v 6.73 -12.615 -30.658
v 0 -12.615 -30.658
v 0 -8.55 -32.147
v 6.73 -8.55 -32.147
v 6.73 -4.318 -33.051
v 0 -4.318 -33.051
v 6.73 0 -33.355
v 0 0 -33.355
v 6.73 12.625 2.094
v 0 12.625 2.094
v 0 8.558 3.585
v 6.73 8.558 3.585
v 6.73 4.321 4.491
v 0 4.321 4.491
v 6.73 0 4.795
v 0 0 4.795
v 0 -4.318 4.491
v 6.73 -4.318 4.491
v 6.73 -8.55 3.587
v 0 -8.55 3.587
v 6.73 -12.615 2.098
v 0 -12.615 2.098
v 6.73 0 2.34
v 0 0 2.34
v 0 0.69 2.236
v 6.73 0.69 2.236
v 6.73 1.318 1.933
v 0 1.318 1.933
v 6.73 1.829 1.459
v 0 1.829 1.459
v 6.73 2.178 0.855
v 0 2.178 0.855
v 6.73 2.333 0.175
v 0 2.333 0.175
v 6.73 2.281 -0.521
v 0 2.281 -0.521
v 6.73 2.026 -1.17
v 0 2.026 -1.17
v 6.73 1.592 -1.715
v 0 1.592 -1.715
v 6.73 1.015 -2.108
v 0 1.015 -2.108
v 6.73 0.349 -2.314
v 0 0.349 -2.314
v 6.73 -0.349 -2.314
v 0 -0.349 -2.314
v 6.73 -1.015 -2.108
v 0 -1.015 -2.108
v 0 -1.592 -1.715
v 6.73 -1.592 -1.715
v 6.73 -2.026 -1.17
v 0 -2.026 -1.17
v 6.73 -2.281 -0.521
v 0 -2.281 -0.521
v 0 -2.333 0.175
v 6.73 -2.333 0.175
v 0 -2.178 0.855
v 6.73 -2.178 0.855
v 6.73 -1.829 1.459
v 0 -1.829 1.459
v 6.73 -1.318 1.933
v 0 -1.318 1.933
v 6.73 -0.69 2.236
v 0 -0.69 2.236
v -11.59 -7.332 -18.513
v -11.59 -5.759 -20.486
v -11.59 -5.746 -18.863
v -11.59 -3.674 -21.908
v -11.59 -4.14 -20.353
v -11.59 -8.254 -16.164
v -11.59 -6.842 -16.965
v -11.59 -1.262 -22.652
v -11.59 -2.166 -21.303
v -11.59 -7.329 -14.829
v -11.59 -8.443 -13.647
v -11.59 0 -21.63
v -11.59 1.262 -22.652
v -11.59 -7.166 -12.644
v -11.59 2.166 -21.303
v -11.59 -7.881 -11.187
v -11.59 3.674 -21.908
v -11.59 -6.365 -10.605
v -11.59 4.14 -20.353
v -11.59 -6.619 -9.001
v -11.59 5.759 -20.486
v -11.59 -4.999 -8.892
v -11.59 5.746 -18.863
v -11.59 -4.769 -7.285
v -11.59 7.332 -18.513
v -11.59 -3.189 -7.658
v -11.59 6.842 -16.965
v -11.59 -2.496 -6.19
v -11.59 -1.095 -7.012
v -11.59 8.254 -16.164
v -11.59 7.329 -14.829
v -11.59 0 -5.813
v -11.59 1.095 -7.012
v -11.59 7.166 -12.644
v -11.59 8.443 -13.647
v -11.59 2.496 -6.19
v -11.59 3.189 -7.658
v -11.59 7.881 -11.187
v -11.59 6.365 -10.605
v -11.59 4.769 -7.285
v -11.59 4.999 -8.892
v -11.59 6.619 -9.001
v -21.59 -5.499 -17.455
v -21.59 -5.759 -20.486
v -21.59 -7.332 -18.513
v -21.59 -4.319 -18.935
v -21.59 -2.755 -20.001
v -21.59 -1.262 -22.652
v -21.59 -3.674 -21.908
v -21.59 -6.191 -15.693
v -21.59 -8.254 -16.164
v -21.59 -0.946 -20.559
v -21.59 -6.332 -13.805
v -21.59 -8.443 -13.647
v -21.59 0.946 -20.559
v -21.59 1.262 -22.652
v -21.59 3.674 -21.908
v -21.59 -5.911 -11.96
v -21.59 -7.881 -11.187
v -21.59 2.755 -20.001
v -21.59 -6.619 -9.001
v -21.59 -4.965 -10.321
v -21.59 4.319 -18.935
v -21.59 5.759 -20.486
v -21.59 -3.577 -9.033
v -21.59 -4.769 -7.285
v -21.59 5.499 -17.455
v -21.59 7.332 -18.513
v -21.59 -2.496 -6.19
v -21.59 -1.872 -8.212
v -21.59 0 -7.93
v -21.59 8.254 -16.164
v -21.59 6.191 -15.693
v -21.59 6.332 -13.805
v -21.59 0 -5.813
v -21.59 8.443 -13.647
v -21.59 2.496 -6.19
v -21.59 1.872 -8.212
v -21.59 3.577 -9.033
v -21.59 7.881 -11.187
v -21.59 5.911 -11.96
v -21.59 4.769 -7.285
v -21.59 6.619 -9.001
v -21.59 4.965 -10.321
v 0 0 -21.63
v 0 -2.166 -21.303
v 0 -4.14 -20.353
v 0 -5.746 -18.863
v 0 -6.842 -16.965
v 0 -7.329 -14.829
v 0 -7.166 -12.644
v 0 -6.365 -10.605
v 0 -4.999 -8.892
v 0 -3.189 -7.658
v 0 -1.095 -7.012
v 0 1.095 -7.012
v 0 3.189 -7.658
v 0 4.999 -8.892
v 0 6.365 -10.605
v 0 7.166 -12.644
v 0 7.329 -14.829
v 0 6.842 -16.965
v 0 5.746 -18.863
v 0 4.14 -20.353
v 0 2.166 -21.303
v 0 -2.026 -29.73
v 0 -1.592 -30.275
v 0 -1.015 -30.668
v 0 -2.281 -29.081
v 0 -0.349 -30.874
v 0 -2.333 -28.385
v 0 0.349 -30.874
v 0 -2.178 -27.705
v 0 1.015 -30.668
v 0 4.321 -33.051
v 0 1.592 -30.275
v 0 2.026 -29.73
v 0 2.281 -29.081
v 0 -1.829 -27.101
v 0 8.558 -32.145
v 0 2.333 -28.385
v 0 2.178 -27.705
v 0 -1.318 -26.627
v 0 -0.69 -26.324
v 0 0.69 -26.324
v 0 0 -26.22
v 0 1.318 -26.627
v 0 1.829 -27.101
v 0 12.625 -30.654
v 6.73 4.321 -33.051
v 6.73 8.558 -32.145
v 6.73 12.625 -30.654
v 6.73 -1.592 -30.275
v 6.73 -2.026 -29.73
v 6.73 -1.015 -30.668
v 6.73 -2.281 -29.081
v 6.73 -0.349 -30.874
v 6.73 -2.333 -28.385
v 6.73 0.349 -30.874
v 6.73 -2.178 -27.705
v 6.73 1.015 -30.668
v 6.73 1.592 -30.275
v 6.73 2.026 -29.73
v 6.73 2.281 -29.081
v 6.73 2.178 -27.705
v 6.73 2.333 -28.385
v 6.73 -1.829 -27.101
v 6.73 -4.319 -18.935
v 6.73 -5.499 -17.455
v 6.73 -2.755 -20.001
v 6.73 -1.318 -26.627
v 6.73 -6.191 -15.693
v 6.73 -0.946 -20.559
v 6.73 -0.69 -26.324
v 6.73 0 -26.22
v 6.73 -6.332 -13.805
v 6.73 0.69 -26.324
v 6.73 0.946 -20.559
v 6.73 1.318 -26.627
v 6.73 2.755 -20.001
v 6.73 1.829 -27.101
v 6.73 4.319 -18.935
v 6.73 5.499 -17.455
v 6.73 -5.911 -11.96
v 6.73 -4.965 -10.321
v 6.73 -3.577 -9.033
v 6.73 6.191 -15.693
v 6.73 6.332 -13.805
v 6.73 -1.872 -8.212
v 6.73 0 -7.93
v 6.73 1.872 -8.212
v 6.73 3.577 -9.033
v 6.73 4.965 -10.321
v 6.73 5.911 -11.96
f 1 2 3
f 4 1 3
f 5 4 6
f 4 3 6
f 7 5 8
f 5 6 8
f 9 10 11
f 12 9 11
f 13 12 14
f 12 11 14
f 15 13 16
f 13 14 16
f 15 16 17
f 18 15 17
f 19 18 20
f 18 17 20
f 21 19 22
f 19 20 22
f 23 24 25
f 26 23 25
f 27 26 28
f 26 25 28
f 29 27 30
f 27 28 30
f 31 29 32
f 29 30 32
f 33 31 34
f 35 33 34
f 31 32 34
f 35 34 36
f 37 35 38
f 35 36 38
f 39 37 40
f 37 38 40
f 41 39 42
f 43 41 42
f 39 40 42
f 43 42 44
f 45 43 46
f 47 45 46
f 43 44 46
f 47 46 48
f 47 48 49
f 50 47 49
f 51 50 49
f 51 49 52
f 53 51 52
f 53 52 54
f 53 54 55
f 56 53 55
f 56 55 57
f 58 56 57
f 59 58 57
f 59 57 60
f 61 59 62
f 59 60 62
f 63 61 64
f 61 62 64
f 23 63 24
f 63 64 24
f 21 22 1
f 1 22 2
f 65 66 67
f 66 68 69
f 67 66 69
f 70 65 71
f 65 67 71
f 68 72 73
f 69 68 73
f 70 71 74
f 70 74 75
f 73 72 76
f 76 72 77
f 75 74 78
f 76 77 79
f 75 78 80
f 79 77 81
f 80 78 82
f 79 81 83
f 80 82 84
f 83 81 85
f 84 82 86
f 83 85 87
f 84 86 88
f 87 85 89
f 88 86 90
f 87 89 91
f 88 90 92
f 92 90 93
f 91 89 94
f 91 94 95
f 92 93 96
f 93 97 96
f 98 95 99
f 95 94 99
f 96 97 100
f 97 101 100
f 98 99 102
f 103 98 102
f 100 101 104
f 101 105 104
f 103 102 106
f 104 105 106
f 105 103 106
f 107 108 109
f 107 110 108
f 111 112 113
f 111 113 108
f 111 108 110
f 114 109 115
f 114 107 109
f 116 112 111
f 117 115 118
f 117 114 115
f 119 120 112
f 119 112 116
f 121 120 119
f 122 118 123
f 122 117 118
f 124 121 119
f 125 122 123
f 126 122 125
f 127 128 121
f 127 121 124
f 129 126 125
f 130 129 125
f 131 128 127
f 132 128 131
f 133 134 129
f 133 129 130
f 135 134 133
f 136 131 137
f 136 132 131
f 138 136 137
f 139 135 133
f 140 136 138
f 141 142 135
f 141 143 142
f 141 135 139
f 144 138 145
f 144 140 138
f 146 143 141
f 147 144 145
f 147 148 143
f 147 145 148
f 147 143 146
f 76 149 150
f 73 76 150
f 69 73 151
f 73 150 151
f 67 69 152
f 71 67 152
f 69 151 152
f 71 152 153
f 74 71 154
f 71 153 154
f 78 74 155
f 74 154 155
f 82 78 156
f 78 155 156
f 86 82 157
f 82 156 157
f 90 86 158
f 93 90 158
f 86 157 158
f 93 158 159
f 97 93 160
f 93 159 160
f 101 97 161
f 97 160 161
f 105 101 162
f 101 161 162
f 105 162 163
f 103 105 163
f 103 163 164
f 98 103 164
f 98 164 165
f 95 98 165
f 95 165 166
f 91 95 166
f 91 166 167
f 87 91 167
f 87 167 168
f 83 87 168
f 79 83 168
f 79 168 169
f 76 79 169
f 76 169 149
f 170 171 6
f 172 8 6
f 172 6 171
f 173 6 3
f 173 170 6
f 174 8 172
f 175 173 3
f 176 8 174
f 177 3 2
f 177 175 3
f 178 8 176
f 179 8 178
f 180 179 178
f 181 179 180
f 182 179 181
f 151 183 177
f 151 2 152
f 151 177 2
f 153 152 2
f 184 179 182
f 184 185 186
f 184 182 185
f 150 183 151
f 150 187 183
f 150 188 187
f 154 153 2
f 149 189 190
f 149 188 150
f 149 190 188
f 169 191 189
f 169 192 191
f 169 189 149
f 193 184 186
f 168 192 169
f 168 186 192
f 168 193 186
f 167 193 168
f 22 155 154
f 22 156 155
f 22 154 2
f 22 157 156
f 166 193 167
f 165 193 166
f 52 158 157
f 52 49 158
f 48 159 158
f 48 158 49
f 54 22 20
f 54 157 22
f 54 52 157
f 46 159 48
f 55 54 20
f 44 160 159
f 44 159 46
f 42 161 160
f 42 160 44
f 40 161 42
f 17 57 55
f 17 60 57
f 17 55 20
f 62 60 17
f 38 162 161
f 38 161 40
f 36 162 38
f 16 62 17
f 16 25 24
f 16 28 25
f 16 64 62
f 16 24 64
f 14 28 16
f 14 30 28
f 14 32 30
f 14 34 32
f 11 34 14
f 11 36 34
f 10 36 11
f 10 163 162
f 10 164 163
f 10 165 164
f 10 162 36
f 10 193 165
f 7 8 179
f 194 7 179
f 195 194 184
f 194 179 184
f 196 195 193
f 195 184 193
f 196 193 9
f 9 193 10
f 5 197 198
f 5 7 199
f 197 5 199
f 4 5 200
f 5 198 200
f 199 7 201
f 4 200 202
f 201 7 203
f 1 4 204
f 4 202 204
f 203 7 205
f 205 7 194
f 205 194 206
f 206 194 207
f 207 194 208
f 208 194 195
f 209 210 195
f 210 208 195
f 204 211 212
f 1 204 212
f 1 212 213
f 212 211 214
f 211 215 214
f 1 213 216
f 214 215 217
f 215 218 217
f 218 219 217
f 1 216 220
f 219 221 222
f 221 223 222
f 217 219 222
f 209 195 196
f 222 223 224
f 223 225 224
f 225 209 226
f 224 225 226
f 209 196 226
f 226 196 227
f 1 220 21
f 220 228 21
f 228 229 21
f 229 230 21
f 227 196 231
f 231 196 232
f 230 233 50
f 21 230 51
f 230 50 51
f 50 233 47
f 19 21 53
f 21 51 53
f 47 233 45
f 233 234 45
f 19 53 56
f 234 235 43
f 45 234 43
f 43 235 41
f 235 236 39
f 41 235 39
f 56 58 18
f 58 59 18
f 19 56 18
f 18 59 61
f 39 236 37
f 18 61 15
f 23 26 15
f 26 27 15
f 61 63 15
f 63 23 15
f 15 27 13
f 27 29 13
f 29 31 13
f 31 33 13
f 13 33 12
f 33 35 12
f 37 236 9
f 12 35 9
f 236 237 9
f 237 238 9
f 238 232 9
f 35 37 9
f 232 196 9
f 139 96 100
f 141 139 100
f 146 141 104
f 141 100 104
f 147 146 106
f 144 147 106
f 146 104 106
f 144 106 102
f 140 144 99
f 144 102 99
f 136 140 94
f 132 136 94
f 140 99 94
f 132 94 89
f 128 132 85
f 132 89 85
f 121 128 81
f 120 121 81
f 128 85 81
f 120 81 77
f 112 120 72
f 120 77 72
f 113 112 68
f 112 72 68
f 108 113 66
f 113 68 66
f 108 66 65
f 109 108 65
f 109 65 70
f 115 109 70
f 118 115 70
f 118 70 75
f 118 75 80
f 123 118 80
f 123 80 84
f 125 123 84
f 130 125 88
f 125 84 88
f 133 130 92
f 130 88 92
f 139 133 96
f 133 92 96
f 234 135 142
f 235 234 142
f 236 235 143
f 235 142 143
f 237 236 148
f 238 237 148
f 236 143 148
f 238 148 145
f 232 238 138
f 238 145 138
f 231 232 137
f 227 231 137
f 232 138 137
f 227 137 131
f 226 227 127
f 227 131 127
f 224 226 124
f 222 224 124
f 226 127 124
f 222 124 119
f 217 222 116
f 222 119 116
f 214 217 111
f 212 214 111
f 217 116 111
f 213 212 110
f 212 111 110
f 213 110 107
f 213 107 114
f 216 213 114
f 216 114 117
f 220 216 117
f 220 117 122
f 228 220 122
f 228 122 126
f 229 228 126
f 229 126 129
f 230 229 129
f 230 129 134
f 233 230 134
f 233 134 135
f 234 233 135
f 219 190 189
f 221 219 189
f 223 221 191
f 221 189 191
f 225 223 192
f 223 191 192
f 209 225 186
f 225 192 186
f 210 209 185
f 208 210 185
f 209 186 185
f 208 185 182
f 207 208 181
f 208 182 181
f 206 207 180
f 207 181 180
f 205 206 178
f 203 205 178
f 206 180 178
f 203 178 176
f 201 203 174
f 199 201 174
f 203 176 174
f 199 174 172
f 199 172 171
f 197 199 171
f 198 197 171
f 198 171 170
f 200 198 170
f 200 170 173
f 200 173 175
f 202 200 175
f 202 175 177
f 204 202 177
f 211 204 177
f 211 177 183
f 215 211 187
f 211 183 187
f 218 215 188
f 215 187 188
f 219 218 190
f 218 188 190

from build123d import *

# Parameters (mm, degrees)
BOSS_EXTRUDE1_DEPTH = 6.73
CUT_EXTRUDE5_DEPTH  = 6.73
SKETCH4_R           = 7.35
BOSS_EXTRUDE2_DEPTH = 21.59
SKETCH5_R           = 6.35
CUT_EXTRUDE6_DEPTH  = 46.540850343
BOSS_EXTRUDE3_START = -10
SKETCH6_R           = 8.466621056
SKETCH6_R_2         = 7.35
BOSS_EXTRUDE3_DEPTH = 10
SKETCH7_R           = 2.5
SKETCH7_R_2         = 2.34
BOSS_EXTRUDE4_DEPTH = 6.73


with BuildPart() as part:
    # Sketch1 → Boss-Extrude1 (new body)
    with BuildSketch(Plane(origin=(0, 0, 0), x_dir=(0, 0, -1), z_dir=(1, 0, 0))):
        with BuildLine():
            Line((14.28, 0), (2.5, 0))
            ThreePointArc((2.5, 0), (0, -2.5), (-2.5, 0))
            Line((-2.5, 0), (-4.795, 0))
            Line((-4.795, 0), (-4.795, -12.615))
            Line((-4.795, -12.615), (14.28, -12.615))
            Line((14.28, -12.615), (14.28, 0))
        make_face()
        with BuildLine():
            ThreePointArc((-2.5, 0), (0, 2.5), (2.5, 0))
            Line((2.5, 0), (14.28, 0))
            Line((14.28, 0), (14.28, 12.625))
            Line((14.28, 12.625), (-4.795, 12.625))
            Line((-4.795, 12.625), (-4.795, 0))
            Line((-4.795, 0), (-2.5, 0))
        make_face()
        with BuildLine():
            Line((14.28, 12.625), (14.28, 0))
            Line((14.28, 0), (26.06, 0))
            ThreePointArc((26.06, 0), (28.56, 2.5), (31.06, 0))
            Line((31.06, 0), (33.355, 0))
            Line((33.355, 0), (33.355, 12.625))
            Line((33.355, 12.625), (14.28, 12.625))
        make_face()
        with BuildLine():
            Line((26.06, 0), (14.28, 0))
            Line((14.28, 0), (14.28, -12.615))
            Line((14.28, -12.615), (33.355, -12.615))
            Line((33.355, -12.615), (33.355, 0))
            Line((33.355, 0), (31.06, 0))
            ThreePointArc((31.06, 0), (28.56, -2.5), (26.06, 0))
        make_face()
    extrude(amount=BOSS_EXTRUDE1_DEPTH)

    # Sketch3 → Cut-Extrude5 (cut)
    with BuildSketch(Plane.ZY):
        with BuildLine():
            Line((4.795, -12.615), (4.795, 0))
            ThreePointArc((4.795, 0), (4.113307599, -6.450002601), (2.098352225, -12.615))
            Line((2.098352225, -12.615), (4.795, -12.615))
        make_face()
        with BuildLine():
            Line((4.795, 12.625), (2.093870071, 12.625))
            ThreePointArc((2.093870071, 12.625), (4.112161723, 6.455360716), (4.795, 0))
            Line((4.795, 0), (4.795, 12.625))
        make_face()
        with BuildLine():
            ThreePointArc((-33.355, 1.23e-07), (-32.67216171, 6.455360776), (-30.653870071, 12.625))
            Line((-30.653870071, 12.625), (-33.355, 12.625))
            Line((-33.355, 12.625), (-33.355, 1.23e-07))
        make_face()
        with BuildLine():
            ThreePointArc((-30.658352225, -12.615), (-32.673307611, -6.450002541), (-33.355, 1.23e-07))
            Line((-33.355, 1.23e-07), (-33.355, -12.615))
            Line((-33.355, -12.615), (-30.658352225, -12.615))
        make_face()
    extrude(amount=-CUT_EXTRUDE5_DEPTH, mode=Mode.SUBTRACT)

    # Sketch4 → Boss-Extrude2 (add)
    with BuildSketch(Plane.ZY):
        with Locations(Location((-14.28, 0, 0), (0, 0, 180))):
            Circle(SKETCH4_R)
    extrude(amount=BOSS_EXTRUDE2_DEPTH)

    # Sketch5 → Cut-Extrude6 (cut, through all)
    with BuildSketch(Plane.ZY.offset(21.59)):
        with Locations((-14.28, 0)):
            Circle(SKETCH5_R)
    extrude(amount=-CUT_EXTRUDE6_DEPTH, mode=Mode.SUBTRACT)

    # Sketch6 → Boss-Extrude3 (add)
    with BuildSketch(Plane.ZY.offset(21.59).offset(BOSS_EXTRUDE3_START)):
        with Locations((-14.28, 0)):
            Circle(SKETCH6_R)
        with Locations(Location((-14.28, 0, 0), (0, 0, 180))):
            Circle(SKETCH6_R_2, mode=Mode.SUBTRACT)
    extrude(amount=BOSS_EXTRUDE3_DEPTH)

    # Sketch7 → Boss-Extrude4 (add, through all)
    # profile 1 of 2: a face of its own
    with BuildSketch(Plane.ZY):
        with Locations((-28.56, 0)):
            Circle(SKETCH7_R)
        with Locations((-28.56, 0)):
            Circle(SKETCH7_R_2, mode=Mode.SUBTRACT)
    # profile 2 of 2: a face of its own
    with BuildSketch(Plane.ZY):
        Circle(SKETCH7_R)
        Circle(SKETCH7_R_2, mode=Mode.SUBTRACT)
    extrude(amount=-BOSS_EXTRUDE4_DEPTH)


solid = part.part
